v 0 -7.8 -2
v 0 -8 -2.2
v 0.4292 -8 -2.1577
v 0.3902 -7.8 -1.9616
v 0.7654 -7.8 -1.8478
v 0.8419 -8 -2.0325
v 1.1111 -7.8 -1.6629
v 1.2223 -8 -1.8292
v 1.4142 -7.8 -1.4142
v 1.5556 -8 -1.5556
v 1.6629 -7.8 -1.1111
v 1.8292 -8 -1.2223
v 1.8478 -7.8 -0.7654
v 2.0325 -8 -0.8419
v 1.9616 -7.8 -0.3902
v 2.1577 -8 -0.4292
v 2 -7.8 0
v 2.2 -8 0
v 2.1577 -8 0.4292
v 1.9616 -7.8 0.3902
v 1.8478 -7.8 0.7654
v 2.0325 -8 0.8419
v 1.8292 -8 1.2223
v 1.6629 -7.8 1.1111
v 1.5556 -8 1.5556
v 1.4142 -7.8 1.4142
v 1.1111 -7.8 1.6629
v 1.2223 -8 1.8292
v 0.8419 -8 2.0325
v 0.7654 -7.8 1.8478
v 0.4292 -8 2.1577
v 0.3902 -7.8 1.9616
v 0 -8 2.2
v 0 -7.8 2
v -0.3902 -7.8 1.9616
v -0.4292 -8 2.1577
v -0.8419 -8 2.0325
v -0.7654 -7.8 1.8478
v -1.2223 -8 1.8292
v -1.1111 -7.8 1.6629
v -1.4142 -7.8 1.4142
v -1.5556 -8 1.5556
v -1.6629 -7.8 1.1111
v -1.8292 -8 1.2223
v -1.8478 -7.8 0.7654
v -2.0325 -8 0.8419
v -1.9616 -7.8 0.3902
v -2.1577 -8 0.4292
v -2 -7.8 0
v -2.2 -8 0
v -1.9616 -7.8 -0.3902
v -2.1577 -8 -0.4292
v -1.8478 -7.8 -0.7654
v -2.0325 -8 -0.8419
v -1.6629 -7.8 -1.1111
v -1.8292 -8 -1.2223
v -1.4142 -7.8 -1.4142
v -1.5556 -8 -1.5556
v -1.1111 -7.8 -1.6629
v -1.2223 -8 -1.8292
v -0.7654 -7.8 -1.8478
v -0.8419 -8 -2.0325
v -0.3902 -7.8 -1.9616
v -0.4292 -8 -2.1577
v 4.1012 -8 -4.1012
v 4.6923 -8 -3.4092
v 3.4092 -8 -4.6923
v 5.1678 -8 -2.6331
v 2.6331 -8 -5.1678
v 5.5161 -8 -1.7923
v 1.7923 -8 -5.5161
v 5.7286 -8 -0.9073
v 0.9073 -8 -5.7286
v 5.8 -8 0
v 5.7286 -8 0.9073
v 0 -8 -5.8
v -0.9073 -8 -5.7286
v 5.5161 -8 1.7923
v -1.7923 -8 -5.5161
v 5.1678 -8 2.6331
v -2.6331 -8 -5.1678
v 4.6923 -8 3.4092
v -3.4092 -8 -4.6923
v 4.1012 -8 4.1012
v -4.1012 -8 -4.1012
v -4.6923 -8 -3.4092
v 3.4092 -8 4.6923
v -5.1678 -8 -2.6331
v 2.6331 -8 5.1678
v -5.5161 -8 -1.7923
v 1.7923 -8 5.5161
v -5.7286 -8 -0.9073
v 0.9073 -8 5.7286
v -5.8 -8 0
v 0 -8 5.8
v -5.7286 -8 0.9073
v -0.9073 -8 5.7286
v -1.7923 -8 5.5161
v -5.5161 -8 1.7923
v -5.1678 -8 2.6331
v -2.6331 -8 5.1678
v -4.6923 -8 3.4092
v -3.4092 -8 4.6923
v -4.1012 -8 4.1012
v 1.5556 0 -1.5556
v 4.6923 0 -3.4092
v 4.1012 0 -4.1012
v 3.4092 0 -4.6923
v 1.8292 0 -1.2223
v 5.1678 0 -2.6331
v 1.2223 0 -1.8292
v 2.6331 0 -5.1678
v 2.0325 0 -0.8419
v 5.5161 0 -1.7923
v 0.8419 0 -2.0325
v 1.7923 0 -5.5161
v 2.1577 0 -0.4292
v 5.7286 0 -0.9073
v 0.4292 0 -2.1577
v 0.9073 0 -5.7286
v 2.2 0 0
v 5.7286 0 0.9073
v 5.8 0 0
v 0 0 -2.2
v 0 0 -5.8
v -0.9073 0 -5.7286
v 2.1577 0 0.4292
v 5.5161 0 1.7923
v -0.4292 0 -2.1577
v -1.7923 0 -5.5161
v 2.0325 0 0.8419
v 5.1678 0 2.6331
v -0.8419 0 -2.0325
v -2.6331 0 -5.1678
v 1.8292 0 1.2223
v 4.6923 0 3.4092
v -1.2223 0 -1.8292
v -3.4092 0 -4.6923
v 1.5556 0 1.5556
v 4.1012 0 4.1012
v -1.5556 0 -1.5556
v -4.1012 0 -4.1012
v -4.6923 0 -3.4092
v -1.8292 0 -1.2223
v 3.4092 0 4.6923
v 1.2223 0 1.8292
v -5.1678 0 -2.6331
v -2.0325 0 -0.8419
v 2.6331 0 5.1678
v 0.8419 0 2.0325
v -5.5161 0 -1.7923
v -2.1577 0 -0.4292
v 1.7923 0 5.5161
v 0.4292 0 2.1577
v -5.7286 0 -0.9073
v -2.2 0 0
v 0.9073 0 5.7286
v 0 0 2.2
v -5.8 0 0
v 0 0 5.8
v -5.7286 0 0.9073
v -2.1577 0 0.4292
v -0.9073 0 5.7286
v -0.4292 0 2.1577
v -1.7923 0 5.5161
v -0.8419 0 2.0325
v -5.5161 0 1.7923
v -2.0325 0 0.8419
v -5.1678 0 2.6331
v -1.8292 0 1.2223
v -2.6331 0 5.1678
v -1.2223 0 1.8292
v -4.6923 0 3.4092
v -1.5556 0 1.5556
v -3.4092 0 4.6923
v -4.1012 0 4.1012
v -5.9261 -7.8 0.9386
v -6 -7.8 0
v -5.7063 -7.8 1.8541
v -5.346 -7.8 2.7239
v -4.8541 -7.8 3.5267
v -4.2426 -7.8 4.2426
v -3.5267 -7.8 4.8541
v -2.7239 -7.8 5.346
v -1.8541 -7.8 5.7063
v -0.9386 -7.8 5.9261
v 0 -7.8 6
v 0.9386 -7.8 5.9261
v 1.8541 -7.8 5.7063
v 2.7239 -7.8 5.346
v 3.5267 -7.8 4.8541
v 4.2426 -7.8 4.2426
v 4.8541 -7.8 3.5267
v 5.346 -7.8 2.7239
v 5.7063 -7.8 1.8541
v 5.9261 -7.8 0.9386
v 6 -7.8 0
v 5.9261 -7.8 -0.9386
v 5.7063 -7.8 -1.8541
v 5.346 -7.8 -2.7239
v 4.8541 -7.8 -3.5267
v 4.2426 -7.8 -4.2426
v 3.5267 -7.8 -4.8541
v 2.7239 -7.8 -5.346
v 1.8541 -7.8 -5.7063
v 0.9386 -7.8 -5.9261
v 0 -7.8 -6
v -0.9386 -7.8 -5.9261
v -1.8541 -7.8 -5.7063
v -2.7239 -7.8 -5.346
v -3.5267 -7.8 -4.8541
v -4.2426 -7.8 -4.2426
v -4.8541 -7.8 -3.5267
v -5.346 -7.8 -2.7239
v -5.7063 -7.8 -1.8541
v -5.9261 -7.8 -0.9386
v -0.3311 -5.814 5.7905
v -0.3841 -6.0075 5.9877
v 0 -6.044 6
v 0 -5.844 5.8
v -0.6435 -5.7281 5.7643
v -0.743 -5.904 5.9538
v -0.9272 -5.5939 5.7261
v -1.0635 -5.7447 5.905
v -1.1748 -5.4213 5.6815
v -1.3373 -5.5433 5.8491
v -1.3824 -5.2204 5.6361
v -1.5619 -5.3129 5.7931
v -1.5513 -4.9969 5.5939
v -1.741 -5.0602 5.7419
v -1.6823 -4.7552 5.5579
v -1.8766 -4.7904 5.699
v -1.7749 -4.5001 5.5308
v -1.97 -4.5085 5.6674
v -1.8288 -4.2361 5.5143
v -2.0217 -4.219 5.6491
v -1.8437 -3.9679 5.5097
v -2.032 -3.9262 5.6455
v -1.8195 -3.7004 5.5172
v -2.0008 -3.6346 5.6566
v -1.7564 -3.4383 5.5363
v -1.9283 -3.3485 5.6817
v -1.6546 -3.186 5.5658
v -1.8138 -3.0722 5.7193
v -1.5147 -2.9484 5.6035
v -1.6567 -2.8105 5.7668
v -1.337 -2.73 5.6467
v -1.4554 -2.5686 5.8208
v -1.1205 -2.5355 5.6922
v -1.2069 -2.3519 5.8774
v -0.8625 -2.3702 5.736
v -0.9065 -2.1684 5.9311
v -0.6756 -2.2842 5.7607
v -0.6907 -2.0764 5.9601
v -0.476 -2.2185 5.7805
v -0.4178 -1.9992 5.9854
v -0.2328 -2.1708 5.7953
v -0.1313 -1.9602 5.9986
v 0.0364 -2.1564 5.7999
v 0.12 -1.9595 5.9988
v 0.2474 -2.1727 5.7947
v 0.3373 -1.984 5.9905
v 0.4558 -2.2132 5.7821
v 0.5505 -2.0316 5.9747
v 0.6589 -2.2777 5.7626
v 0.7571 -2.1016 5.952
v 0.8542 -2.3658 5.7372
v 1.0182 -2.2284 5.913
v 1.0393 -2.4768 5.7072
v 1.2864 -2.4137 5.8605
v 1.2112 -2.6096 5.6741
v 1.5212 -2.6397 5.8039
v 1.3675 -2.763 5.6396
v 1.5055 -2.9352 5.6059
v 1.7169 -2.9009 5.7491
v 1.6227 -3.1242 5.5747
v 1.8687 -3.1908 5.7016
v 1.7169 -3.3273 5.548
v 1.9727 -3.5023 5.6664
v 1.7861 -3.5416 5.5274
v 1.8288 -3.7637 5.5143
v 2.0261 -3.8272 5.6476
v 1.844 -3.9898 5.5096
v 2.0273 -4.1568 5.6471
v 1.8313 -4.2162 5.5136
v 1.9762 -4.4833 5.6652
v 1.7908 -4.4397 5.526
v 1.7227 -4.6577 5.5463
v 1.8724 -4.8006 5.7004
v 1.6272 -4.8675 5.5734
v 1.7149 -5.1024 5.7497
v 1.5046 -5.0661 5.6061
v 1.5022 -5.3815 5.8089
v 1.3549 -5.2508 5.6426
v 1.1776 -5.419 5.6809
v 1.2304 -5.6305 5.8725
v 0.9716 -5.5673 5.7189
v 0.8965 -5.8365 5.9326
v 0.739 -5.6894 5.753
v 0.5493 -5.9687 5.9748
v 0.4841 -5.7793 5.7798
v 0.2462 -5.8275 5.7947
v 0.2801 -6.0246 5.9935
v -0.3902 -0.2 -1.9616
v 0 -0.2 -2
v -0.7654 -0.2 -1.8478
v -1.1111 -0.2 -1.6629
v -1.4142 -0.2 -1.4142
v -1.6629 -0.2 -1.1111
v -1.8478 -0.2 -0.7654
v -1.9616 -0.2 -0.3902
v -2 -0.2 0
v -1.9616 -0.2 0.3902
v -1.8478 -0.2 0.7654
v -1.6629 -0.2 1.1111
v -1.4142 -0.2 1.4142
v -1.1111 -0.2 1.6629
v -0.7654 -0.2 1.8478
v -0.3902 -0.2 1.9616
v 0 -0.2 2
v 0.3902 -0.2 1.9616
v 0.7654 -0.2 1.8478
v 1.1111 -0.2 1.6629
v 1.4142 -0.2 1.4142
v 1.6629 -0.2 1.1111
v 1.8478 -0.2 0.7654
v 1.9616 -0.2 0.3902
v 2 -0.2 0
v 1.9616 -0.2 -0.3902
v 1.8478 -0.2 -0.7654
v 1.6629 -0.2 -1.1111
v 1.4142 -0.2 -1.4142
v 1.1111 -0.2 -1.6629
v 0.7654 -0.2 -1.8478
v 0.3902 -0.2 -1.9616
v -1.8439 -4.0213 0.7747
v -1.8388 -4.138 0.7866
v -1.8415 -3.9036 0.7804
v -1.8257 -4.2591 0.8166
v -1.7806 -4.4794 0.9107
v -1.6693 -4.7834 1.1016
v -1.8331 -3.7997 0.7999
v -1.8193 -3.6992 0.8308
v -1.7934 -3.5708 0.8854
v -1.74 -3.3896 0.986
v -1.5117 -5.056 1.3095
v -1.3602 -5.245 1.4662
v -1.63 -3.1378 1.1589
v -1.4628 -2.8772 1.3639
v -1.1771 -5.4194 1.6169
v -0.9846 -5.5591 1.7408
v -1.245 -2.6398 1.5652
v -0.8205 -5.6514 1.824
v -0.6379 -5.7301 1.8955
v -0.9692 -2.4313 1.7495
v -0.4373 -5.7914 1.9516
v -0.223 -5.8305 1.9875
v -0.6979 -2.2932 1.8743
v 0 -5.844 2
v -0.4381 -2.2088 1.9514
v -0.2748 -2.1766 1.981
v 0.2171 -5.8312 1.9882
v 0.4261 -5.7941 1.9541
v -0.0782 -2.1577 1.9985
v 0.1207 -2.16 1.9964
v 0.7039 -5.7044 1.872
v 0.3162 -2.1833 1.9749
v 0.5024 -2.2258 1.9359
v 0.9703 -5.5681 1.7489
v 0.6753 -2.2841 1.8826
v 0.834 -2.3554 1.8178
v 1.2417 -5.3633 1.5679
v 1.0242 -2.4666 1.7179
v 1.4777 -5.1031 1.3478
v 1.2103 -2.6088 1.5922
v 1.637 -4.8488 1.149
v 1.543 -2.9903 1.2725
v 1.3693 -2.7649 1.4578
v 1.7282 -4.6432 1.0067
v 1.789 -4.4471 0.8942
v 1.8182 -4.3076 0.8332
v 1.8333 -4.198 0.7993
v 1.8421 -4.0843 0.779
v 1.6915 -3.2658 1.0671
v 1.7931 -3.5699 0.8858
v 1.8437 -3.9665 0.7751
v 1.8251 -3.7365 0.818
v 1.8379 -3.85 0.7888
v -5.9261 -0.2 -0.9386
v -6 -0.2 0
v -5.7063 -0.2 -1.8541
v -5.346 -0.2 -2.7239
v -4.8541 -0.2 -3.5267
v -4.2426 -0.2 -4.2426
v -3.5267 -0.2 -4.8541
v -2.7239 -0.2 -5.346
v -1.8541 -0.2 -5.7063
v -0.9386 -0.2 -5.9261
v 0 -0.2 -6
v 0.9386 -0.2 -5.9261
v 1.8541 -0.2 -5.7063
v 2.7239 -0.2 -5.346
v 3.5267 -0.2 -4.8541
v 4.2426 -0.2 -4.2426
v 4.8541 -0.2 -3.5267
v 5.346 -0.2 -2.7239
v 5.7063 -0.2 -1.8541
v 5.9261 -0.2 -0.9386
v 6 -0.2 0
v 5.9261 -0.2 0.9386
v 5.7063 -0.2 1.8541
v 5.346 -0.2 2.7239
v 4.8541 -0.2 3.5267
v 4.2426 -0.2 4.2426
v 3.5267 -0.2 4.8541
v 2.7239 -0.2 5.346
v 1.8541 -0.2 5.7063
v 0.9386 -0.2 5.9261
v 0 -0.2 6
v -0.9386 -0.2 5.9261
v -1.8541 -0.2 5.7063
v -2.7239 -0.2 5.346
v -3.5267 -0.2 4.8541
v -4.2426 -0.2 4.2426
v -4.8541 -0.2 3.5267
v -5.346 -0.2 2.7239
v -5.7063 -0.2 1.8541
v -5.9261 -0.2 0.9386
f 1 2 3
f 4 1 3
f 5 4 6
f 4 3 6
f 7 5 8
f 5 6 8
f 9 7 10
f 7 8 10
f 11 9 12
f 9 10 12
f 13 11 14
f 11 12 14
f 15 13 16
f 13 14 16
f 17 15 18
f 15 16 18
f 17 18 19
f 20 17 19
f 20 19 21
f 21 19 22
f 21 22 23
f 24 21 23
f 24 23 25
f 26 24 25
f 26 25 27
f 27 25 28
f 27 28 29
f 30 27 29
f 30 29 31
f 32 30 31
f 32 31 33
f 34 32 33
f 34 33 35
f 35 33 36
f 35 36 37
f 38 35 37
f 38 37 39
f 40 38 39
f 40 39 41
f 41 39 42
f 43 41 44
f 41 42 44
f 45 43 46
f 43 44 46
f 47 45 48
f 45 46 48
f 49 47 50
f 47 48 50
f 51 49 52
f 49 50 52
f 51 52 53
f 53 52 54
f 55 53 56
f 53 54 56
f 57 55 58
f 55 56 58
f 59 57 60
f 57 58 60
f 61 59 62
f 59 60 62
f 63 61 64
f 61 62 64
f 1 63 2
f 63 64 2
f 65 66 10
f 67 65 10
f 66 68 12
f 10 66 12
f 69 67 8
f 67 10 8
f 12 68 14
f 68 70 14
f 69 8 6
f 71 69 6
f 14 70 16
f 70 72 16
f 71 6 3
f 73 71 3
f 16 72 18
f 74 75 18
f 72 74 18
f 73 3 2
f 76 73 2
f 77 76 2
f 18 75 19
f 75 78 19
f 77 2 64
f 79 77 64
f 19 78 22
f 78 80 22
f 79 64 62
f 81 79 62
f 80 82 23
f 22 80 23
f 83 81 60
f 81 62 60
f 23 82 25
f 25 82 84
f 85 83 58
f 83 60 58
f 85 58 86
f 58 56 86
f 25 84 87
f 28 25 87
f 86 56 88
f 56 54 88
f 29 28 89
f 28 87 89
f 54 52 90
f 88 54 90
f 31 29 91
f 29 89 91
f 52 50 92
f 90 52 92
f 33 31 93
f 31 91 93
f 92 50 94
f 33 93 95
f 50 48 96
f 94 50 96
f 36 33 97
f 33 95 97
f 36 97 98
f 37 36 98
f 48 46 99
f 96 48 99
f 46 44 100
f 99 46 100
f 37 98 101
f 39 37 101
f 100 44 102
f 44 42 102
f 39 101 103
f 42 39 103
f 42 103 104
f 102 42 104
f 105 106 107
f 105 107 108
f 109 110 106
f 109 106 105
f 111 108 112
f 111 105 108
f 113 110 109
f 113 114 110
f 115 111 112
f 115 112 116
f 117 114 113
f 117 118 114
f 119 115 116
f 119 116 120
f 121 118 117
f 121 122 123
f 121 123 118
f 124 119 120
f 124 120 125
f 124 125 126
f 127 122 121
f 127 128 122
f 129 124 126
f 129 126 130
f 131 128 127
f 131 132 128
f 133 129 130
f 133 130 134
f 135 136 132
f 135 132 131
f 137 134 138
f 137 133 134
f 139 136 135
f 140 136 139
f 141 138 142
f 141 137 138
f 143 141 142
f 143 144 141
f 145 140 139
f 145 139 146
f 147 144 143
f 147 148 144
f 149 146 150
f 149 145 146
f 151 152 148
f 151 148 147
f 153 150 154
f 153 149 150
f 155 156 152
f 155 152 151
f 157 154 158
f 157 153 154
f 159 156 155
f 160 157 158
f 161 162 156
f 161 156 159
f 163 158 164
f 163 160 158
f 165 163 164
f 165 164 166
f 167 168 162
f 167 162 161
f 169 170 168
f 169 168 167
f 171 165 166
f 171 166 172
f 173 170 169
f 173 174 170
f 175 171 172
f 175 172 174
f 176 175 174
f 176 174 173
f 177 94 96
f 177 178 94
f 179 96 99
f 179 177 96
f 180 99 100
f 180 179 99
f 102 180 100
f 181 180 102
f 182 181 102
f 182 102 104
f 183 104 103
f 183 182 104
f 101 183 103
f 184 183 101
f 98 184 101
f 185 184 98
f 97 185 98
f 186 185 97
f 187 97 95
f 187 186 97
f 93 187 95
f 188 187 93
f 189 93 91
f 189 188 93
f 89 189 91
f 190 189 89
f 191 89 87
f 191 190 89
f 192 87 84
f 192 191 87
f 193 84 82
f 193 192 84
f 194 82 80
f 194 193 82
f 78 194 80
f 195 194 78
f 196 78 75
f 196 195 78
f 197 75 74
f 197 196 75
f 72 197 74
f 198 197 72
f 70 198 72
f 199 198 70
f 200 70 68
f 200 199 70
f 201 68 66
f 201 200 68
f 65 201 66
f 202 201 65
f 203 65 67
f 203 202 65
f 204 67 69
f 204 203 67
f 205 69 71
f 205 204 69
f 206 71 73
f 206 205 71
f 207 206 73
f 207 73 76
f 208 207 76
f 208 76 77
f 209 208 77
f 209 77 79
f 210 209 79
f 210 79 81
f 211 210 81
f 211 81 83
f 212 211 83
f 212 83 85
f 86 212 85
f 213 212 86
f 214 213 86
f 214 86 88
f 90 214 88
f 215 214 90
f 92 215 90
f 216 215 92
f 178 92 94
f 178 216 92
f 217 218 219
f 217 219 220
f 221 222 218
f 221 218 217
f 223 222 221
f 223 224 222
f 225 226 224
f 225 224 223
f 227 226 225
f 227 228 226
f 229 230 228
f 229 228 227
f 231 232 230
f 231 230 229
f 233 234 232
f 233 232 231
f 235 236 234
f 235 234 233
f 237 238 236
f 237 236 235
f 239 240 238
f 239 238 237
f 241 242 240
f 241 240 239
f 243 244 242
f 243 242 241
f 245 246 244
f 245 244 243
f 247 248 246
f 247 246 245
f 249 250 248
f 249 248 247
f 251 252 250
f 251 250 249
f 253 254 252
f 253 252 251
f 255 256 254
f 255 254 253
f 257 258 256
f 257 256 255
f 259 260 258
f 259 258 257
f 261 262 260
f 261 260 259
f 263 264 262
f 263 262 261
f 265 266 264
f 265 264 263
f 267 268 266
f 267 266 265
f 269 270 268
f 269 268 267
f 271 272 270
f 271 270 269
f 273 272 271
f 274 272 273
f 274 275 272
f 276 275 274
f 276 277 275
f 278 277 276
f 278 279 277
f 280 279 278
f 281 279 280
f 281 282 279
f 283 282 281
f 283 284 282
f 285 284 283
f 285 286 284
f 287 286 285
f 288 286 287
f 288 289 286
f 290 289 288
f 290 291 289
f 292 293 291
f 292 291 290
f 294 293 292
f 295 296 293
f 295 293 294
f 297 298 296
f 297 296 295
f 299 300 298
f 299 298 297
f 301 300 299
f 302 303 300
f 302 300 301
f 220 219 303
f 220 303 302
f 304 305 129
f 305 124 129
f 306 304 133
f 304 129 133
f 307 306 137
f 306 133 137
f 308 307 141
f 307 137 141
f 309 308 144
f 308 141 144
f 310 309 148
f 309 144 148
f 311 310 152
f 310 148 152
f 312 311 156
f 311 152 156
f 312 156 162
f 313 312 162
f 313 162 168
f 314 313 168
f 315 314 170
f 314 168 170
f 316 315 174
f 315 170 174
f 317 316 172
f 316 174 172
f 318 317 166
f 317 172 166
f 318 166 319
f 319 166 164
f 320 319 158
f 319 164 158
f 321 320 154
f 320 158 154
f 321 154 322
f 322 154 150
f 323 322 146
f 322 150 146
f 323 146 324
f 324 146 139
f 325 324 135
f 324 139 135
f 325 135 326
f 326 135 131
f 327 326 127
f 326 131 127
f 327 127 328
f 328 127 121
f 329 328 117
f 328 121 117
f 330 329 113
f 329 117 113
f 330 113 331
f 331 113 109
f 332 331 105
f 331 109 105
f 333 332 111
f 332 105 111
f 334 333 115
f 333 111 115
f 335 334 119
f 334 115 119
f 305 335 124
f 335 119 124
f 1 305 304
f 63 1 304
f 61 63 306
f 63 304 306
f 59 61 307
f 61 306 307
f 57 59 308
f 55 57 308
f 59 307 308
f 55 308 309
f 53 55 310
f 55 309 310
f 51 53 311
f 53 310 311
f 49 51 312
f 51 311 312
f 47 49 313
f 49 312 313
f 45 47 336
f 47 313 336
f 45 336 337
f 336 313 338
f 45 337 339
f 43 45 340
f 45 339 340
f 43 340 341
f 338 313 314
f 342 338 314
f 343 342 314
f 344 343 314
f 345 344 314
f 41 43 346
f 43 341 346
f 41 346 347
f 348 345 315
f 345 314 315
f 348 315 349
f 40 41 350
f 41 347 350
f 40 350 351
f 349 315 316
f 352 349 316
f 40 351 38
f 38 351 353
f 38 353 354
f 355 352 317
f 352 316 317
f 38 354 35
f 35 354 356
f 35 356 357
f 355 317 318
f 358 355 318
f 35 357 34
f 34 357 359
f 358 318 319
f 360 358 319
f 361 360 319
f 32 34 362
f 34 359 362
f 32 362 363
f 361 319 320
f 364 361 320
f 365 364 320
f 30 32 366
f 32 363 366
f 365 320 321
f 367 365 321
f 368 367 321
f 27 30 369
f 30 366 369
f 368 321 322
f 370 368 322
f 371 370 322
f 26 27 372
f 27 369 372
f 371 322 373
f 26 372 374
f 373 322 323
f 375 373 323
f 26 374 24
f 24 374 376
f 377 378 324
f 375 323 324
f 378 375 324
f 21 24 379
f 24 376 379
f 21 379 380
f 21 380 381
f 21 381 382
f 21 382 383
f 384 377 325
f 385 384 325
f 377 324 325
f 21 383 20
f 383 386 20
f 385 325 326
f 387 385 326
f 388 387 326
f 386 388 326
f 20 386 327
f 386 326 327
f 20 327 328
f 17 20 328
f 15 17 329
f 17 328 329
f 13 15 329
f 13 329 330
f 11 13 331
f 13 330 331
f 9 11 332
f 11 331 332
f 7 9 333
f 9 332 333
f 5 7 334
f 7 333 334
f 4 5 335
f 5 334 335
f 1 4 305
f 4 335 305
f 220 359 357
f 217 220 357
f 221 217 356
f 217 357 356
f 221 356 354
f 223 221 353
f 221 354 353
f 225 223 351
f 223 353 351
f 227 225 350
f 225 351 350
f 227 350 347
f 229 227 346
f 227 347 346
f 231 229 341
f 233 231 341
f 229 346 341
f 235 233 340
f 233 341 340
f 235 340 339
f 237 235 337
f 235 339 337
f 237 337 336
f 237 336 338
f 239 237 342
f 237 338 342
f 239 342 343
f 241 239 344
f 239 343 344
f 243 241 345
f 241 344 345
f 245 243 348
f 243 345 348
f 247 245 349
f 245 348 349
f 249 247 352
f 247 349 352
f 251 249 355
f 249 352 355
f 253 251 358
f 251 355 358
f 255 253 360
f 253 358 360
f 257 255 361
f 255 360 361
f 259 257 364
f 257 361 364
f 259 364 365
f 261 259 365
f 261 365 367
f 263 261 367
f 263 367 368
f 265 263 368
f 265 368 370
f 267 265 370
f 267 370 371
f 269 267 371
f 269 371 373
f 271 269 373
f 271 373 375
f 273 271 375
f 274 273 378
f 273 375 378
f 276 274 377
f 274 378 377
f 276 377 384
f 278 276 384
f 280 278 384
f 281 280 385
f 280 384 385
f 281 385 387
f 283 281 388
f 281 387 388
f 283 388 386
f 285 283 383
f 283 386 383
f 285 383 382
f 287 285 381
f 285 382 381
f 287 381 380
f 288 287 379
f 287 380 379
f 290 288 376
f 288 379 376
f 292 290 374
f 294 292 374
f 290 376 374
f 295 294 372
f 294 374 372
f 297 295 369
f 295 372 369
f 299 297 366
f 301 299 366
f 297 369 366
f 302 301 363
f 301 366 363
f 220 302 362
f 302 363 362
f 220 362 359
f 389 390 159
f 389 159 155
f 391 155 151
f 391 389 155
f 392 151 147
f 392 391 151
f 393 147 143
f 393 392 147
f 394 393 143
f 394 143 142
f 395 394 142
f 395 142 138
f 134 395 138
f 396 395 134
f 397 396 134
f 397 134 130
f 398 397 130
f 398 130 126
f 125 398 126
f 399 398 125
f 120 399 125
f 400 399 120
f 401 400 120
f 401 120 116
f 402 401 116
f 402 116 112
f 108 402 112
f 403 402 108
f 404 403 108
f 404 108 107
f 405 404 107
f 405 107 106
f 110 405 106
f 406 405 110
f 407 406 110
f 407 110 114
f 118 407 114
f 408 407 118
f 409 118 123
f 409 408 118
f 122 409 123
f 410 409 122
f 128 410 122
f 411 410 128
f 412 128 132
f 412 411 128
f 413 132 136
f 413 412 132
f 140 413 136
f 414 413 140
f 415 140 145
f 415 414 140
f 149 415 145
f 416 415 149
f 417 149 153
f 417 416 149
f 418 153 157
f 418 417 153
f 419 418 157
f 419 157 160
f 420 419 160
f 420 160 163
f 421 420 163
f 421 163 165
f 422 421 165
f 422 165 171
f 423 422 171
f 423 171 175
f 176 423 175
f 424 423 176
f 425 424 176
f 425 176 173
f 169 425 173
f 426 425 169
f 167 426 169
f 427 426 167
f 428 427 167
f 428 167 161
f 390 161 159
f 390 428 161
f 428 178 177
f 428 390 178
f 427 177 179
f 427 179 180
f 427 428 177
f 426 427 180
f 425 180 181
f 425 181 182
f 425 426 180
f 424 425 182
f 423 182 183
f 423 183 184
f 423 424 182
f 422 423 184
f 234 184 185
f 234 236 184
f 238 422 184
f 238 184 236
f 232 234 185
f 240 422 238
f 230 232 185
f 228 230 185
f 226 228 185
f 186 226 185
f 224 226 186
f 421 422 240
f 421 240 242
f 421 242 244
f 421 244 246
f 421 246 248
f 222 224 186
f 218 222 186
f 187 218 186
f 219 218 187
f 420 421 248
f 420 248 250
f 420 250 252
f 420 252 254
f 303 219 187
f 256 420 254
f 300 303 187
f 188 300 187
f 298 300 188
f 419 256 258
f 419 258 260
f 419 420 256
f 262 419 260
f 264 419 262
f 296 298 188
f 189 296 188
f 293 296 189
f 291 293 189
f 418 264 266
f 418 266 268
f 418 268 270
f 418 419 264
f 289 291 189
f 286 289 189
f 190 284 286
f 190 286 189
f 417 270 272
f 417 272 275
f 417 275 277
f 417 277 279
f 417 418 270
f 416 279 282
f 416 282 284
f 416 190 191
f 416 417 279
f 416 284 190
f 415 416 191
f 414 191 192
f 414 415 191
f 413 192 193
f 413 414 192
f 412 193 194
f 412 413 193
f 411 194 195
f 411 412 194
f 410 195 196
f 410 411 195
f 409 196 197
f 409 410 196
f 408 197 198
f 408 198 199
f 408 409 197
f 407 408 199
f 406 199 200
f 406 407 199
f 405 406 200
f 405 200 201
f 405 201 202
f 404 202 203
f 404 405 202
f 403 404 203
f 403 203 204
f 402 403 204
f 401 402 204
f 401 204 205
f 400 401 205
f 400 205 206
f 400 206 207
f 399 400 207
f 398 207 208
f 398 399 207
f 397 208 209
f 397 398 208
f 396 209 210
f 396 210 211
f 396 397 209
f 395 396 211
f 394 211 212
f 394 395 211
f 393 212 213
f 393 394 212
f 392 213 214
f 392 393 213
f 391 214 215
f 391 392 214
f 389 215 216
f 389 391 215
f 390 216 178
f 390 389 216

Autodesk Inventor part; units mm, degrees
ref_plane "YZ Plane" through (0, 0, 0) normal (1, 0, 0) x (0, 1, 0)
ref_plane "XZ Plane" through (0, 0, 0) normal (0, 1, 0) x (-1, 0, 0)
sketch "Sketch1" plane through (0, 0, 0) normal (0, 1, 0) x (-1, 0, 0)
  circle A0 centre (0, 0) radius 6
  dimension "d0" = 12
extrude "Extrusion1" add sketch "Sketch1" against normal blind 8
chamfer "Chamfer1" distance 0.2 angle 45 2 edges at (6, -8, 0) (6, 0, 0)
sketch "Sketch2" plane through (0, -8, 0) normal (0, -1, 0) x (1, 0, 0)
  point P0 (0, 0)
hole "Hole1" at (0, -8, 0) direction (0, 1, 0) diameter 4 end through all
chamfer "Chamfer2" distance 0.2 angle 45 2 edges at (0, -8, 2) (0, 0, 2)
ref_plane "Work Plane1" through (0, 0, 6) normal (0, 0, 1) x (1, 0, 0)
sketch "Sketch3" plane through (0, 0, 6) normal (0, 0, 1) x (1, 0, 0)
  line L0 (-6, -0.2) -> (-6, -7.8) projected
  line L1 (-5.8, 0) -> (5.8, 0) projected
  point P0 (0, 0)
  point P1 (0, -4)
  point P2 (-6, -4)
hole "Hole2" at (0, -4, 6) direction (0, 0, -1) diameter 3.688 end up to surface thread size "M4.5x0.75" class "6H" standard "ANSI Metric M Profile"
chamfer "Chamfer3" distance 0.2 angle 45 2 edges at (1.8366, -3.8348, 5.712) (-1.844, -4.0029, 5.7096)
properties part number "08-0003" material "Aluminum 6061"
